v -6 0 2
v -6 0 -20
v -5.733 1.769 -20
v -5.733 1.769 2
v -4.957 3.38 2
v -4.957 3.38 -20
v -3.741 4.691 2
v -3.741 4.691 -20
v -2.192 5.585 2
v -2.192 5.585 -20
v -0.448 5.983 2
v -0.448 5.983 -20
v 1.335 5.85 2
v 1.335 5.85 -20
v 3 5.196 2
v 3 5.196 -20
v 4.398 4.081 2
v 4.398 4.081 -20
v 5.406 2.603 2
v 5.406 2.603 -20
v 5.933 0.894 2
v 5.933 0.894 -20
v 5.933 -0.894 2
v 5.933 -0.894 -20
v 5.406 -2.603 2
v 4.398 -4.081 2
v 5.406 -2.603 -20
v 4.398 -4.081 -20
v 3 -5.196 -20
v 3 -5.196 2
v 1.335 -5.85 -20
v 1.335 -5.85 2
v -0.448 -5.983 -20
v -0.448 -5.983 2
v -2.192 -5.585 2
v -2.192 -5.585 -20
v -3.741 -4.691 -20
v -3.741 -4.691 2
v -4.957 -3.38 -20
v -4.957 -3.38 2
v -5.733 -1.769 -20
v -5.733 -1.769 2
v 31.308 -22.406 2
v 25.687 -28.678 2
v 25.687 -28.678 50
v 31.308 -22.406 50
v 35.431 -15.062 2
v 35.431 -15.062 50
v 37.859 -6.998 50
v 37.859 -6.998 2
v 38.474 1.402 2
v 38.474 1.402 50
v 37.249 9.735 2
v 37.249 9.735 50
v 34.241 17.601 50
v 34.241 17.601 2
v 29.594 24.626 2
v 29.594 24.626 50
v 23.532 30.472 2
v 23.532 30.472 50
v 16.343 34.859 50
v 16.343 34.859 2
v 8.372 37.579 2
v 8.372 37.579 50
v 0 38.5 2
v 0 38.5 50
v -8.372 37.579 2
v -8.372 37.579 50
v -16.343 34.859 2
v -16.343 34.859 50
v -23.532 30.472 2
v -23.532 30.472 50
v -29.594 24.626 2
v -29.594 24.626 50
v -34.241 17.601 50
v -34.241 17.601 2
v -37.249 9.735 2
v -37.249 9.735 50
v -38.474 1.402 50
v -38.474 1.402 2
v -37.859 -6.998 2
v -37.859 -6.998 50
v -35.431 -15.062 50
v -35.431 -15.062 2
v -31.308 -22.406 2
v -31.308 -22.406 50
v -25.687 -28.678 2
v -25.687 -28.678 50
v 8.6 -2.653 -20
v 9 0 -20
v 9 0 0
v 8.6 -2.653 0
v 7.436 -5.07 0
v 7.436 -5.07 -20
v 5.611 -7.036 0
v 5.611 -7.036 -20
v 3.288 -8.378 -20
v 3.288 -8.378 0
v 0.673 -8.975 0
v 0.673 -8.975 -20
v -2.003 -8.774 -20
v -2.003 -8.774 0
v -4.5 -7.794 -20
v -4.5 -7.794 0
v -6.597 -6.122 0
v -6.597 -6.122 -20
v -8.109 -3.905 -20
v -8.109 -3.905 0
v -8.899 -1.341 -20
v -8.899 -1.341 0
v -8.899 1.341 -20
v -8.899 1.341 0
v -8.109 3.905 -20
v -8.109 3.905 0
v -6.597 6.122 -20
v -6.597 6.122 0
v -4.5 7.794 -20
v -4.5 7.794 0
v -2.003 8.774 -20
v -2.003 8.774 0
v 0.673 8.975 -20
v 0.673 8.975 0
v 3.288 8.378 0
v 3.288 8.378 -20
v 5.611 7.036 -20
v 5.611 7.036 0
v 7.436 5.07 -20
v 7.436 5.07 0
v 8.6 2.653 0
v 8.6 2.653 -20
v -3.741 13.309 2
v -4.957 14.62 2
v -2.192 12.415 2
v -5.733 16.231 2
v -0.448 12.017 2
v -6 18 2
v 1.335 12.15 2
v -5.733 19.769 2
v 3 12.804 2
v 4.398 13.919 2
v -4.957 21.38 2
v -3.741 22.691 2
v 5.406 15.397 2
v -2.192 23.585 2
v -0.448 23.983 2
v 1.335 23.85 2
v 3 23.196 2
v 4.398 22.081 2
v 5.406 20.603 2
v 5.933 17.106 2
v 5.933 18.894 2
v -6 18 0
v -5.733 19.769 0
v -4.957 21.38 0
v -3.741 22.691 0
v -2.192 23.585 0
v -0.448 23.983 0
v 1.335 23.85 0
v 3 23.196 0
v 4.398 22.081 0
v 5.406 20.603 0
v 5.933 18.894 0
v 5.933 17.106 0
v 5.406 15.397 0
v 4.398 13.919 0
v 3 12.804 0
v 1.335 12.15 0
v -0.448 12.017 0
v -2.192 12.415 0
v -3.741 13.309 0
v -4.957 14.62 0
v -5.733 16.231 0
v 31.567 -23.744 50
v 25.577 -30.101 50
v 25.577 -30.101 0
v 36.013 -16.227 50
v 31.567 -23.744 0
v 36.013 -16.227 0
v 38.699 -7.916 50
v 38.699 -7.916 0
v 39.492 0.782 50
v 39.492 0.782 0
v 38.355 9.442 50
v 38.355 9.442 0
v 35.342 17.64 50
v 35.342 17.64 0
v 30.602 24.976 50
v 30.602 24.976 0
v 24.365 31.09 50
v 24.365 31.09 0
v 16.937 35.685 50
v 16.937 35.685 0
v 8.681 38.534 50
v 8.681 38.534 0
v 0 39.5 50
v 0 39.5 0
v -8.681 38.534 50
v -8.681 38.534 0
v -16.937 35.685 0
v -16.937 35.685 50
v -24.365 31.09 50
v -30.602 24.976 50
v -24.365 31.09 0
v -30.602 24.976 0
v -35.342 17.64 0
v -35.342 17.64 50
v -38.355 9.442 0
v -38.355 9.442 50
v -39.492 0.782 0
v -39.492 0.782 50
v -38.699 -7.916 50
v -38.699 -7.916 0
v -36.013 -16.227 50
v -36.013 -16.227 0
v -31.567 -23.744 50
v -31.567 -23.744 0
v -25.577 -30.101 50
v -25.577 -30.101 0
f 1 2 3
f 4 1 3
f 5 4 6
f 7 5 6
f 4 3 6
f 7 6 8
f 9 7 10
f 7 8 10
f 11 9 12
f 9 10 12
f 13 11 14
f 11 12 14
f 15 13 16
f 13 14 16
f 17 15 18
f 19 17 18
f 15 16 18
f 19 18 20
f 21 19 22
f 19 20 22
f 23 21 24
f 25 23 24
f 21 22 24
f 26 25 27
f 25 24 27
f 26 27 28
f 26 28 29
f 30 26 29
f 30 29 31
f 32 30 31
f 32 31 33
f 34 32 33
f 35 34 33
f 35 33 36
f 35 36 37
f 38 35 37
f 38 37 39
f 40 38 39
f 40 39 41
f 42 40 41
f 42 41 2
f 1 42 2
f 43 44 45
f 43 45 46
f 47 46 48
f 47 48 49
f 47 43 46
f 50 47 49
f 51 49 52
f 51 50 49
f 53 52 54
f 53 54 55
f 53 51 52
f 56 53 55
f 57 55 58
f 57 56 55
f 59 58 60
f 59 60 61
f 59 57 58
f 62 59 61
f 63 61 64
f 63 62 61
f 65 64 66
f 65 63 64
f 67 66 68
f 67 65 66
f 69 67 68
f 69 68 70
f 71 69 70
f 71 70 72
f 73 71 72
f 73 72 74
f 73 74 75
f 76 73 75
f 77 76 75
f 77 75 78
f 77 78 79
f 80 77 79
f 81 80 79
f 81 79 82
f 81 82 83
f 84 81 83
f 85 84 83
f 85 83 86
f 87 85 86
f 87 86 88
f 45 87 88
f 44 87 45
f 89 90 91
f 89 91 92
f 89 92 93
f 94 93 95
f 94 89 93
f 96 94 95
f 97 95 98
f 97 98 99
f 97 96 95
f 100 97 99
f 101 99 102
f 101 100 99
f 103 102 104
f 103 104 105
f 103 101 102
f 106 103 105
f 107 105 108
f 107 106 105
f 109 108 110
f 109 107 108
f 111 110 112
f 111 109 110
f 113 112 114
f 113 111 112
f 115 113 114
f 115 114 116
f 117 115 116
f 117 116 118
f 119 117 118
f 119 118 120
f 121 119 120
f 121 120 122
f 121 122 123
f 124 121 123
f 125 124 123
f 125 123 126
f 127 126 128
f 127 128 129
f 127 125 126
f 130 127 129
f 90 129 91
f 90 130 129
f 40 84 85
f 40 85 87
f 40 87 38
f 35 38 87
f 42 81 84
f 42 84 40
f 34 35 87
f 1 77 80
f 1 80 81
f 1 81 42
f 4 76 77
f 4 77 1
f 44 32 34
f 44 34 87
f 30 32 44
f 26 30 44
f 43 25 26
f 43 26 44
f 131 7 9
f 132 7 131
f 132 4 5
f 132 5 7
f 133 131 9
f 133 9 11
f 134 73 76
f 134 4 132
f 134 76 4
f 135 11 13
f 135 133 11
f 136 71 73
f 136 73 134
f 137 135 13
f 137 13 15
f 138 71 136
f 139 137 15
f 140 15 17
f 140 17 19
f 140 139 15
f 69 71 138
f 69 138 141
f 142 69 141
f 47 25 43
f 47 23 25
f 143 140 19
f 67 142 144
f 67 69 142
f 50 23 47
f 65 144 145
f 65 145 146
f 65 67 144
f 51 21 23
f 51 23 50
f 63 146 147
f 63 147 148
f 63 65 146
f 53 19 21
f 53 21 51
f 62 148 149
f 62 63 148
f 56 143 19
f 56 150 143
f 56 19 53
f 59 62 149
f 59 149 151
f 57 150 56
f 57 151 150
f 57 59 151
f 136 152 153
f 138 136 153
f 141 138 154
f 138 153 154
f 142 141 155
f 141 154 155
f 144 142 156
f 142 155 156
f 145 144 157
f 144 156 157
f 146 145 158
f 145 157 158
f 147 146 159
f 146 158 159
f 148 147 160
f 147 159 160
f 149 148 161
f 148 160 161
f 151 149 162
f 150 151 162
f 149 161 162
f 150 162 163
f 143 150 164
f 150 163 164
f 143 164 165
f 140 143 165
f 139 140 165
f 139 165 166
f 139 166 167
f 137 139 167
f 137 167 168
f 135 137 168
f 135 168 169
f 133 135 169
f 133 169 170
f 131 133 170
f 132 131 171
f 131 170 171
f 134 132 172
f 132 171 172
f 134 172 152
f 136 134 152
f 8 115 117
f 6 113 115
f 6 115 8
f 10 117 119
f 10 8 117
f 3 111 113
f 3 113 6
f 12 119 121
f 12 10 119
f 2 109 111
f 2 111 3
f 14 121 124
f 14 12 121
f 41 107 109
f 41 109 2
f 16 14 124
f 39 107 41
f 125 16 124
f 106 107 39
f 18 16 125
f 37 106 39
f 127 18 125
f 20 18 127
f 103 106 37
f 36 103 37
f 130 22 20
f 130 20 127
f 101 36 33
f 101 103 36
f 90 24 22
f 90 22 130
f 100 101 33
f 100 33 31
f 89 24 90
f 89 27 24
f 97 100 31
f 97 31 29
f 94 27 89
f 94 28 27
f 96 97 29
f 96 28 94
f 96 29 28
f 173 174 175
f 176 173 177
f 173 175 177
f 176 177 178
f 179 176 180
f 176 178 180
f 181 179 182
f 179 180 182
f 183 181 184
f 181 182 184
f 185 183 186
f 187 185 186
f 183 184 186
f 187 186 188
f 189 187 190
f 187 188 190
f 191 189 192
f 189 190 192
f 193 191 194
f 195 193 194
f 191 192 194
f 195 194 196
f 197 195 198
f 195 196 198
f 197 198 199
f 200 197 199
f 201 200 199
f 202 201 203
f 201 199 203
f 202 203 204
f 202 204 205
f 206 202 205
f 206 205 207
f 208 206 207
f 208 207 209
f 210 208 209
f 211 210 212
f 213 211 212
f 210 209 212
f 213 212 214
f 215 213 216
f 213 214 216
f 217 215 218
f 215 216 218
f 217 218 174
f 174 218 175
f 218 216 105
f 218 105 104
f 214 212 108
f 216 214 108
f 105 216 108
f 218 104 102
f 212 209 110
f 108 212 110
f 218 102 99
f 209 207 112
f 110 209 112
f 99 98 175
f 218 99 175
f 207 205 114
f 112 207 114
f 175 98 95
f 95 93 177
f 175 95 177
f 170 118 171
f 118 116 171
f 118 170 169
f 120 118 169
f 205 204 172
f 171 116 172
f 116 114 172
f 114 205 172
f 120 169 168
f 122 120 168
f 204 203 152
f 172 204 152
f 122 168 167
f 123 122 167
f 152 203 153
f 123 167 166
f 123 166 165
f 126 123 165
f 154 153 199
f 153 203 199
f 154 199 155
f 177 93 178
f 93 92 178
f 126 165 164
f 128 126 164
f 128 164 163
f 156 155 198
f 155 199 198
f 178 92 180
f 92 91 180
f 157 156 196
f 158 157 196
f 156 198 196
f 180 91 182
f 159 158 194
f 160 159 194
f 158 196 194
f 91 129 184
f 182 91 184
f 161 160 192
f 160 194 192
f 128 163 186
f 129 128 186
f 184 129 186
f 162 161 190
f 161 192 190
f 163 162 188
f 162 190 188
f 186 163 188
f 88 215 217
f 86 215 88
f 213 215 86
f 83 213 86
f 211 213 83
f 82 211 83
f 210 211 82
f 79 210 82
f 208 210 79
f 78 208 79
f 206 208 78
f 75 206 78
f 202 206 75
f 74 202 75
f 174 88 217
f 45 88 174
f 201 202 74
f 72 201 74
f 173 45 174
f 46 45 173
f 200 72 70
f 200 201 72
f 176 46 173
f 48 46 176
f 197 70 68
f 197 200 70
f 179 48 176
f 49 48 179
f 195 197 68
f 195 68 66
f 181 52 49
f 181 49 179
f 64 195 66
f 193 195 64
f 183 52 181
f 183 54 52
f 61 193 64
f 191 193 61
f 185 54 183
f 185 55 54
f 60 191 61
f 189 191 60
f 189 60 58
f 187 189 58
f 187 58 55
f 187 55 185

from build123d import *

# Parameters (mm, degrees)
BOSS_EXTRUDE1_DEPTH = 50
BOSS_EXTRUDE2_DEPTH = 2
SKETCH3_R           = 6
CUT_EXTRUDE1_DEPTH  = 2
SKETCH4_R           = 6
CUT_EXTRUDE2_DEPTH  = 2
BOSS_EXTRUDE3_START = 20
SKETCH5_R           = 9
SKETCH5_R_2         = 6
BOSS_EXTRUDE3_DEPTH = 20


with BuildPart() as part:
    # Sketch1 → Boss-Extrude1 (new body)
    with BuildSketch(Plane.XY):
        with BuildLine():
            Line((-25.576977383, -30.100967226), (25.576977383, -30.100967226))
            ThreePointArc((25.576977383, -30.100967226), (0, 39.5), (-25.576977383, -30.100967226))
        make_face()
        with BuildLine():
            Line((-25.687078778, -28.677935488), (25.687078778, -28.677935488))
            ThreePointArc((25.687078778, -28.677935488), (0, 38.5), (-25.687078778, -28.677935488))
        make_face(mode=Mode.SUBTRACT)
    extrude(amount=BOSS_EXTRUDE1_DEPTH)

    # Sketch2 → Boss-Extrude2 (add)
    with BuildSketch(Plane(origin=(0, 0, 0), x_dir=(-1, 0, 0), z_dir=(0, 0, -1))):
        with BuildLine():
            Line((25.687078778, -28.677935488), (-25.687078778, -28.677935488))
            ThreePointArc((-25.687078778, -28.677935488), (0, 38.5), (25.687078778, -28.677935488))
        make_face()
    extrude(amount=-BOSS_EXTRUDE2_DEPTH)

    # Sketch3 → Cut-Extrude1 (cut)
    with BuildSketch(Plane(origin=(0, 0, 0), x_dir=(-1, 0, 0), z_dir=(0, 0, -1))):
        Circle(SKETCH3_R)
    extrude(amount=-CUT_EXTRUDE1_DEPTH, mode=Mode.SUBTRACT)

    # Sketch4 → Cut-Extrude2 (cut)
    with BuildSketch(Plane(origin=(0, 0, 0), x_dir=(-1, 0, 0), z_dir=(0, 0, -1))):
        with Locations((0, 18)):
            Circle(SKETCH4_R)
    extrude(amount=-CUT_EXTRUDE2_DEPTH, mode=Mode.SUBTRACT)

    # Sketch5 → Boss-Extrude3 (add)
    with BuildSketch(Plane(origin=(0, 0, 0), x_dir=(-1, 0, 0), z_dir=(0, 0, -1)).offset(BOSS_EXTRUDE3_START)):
        with Locations(Location((0, 0, 0), (0, 0, 180))):
            Circle(SKETCH5_R)
        Circle(SKETCH5_R_2, mode=Mode.SUBTRACT)
    extrude(amount=-BOSS_EXTRUDE3_DEPTH)


solid = part.part
